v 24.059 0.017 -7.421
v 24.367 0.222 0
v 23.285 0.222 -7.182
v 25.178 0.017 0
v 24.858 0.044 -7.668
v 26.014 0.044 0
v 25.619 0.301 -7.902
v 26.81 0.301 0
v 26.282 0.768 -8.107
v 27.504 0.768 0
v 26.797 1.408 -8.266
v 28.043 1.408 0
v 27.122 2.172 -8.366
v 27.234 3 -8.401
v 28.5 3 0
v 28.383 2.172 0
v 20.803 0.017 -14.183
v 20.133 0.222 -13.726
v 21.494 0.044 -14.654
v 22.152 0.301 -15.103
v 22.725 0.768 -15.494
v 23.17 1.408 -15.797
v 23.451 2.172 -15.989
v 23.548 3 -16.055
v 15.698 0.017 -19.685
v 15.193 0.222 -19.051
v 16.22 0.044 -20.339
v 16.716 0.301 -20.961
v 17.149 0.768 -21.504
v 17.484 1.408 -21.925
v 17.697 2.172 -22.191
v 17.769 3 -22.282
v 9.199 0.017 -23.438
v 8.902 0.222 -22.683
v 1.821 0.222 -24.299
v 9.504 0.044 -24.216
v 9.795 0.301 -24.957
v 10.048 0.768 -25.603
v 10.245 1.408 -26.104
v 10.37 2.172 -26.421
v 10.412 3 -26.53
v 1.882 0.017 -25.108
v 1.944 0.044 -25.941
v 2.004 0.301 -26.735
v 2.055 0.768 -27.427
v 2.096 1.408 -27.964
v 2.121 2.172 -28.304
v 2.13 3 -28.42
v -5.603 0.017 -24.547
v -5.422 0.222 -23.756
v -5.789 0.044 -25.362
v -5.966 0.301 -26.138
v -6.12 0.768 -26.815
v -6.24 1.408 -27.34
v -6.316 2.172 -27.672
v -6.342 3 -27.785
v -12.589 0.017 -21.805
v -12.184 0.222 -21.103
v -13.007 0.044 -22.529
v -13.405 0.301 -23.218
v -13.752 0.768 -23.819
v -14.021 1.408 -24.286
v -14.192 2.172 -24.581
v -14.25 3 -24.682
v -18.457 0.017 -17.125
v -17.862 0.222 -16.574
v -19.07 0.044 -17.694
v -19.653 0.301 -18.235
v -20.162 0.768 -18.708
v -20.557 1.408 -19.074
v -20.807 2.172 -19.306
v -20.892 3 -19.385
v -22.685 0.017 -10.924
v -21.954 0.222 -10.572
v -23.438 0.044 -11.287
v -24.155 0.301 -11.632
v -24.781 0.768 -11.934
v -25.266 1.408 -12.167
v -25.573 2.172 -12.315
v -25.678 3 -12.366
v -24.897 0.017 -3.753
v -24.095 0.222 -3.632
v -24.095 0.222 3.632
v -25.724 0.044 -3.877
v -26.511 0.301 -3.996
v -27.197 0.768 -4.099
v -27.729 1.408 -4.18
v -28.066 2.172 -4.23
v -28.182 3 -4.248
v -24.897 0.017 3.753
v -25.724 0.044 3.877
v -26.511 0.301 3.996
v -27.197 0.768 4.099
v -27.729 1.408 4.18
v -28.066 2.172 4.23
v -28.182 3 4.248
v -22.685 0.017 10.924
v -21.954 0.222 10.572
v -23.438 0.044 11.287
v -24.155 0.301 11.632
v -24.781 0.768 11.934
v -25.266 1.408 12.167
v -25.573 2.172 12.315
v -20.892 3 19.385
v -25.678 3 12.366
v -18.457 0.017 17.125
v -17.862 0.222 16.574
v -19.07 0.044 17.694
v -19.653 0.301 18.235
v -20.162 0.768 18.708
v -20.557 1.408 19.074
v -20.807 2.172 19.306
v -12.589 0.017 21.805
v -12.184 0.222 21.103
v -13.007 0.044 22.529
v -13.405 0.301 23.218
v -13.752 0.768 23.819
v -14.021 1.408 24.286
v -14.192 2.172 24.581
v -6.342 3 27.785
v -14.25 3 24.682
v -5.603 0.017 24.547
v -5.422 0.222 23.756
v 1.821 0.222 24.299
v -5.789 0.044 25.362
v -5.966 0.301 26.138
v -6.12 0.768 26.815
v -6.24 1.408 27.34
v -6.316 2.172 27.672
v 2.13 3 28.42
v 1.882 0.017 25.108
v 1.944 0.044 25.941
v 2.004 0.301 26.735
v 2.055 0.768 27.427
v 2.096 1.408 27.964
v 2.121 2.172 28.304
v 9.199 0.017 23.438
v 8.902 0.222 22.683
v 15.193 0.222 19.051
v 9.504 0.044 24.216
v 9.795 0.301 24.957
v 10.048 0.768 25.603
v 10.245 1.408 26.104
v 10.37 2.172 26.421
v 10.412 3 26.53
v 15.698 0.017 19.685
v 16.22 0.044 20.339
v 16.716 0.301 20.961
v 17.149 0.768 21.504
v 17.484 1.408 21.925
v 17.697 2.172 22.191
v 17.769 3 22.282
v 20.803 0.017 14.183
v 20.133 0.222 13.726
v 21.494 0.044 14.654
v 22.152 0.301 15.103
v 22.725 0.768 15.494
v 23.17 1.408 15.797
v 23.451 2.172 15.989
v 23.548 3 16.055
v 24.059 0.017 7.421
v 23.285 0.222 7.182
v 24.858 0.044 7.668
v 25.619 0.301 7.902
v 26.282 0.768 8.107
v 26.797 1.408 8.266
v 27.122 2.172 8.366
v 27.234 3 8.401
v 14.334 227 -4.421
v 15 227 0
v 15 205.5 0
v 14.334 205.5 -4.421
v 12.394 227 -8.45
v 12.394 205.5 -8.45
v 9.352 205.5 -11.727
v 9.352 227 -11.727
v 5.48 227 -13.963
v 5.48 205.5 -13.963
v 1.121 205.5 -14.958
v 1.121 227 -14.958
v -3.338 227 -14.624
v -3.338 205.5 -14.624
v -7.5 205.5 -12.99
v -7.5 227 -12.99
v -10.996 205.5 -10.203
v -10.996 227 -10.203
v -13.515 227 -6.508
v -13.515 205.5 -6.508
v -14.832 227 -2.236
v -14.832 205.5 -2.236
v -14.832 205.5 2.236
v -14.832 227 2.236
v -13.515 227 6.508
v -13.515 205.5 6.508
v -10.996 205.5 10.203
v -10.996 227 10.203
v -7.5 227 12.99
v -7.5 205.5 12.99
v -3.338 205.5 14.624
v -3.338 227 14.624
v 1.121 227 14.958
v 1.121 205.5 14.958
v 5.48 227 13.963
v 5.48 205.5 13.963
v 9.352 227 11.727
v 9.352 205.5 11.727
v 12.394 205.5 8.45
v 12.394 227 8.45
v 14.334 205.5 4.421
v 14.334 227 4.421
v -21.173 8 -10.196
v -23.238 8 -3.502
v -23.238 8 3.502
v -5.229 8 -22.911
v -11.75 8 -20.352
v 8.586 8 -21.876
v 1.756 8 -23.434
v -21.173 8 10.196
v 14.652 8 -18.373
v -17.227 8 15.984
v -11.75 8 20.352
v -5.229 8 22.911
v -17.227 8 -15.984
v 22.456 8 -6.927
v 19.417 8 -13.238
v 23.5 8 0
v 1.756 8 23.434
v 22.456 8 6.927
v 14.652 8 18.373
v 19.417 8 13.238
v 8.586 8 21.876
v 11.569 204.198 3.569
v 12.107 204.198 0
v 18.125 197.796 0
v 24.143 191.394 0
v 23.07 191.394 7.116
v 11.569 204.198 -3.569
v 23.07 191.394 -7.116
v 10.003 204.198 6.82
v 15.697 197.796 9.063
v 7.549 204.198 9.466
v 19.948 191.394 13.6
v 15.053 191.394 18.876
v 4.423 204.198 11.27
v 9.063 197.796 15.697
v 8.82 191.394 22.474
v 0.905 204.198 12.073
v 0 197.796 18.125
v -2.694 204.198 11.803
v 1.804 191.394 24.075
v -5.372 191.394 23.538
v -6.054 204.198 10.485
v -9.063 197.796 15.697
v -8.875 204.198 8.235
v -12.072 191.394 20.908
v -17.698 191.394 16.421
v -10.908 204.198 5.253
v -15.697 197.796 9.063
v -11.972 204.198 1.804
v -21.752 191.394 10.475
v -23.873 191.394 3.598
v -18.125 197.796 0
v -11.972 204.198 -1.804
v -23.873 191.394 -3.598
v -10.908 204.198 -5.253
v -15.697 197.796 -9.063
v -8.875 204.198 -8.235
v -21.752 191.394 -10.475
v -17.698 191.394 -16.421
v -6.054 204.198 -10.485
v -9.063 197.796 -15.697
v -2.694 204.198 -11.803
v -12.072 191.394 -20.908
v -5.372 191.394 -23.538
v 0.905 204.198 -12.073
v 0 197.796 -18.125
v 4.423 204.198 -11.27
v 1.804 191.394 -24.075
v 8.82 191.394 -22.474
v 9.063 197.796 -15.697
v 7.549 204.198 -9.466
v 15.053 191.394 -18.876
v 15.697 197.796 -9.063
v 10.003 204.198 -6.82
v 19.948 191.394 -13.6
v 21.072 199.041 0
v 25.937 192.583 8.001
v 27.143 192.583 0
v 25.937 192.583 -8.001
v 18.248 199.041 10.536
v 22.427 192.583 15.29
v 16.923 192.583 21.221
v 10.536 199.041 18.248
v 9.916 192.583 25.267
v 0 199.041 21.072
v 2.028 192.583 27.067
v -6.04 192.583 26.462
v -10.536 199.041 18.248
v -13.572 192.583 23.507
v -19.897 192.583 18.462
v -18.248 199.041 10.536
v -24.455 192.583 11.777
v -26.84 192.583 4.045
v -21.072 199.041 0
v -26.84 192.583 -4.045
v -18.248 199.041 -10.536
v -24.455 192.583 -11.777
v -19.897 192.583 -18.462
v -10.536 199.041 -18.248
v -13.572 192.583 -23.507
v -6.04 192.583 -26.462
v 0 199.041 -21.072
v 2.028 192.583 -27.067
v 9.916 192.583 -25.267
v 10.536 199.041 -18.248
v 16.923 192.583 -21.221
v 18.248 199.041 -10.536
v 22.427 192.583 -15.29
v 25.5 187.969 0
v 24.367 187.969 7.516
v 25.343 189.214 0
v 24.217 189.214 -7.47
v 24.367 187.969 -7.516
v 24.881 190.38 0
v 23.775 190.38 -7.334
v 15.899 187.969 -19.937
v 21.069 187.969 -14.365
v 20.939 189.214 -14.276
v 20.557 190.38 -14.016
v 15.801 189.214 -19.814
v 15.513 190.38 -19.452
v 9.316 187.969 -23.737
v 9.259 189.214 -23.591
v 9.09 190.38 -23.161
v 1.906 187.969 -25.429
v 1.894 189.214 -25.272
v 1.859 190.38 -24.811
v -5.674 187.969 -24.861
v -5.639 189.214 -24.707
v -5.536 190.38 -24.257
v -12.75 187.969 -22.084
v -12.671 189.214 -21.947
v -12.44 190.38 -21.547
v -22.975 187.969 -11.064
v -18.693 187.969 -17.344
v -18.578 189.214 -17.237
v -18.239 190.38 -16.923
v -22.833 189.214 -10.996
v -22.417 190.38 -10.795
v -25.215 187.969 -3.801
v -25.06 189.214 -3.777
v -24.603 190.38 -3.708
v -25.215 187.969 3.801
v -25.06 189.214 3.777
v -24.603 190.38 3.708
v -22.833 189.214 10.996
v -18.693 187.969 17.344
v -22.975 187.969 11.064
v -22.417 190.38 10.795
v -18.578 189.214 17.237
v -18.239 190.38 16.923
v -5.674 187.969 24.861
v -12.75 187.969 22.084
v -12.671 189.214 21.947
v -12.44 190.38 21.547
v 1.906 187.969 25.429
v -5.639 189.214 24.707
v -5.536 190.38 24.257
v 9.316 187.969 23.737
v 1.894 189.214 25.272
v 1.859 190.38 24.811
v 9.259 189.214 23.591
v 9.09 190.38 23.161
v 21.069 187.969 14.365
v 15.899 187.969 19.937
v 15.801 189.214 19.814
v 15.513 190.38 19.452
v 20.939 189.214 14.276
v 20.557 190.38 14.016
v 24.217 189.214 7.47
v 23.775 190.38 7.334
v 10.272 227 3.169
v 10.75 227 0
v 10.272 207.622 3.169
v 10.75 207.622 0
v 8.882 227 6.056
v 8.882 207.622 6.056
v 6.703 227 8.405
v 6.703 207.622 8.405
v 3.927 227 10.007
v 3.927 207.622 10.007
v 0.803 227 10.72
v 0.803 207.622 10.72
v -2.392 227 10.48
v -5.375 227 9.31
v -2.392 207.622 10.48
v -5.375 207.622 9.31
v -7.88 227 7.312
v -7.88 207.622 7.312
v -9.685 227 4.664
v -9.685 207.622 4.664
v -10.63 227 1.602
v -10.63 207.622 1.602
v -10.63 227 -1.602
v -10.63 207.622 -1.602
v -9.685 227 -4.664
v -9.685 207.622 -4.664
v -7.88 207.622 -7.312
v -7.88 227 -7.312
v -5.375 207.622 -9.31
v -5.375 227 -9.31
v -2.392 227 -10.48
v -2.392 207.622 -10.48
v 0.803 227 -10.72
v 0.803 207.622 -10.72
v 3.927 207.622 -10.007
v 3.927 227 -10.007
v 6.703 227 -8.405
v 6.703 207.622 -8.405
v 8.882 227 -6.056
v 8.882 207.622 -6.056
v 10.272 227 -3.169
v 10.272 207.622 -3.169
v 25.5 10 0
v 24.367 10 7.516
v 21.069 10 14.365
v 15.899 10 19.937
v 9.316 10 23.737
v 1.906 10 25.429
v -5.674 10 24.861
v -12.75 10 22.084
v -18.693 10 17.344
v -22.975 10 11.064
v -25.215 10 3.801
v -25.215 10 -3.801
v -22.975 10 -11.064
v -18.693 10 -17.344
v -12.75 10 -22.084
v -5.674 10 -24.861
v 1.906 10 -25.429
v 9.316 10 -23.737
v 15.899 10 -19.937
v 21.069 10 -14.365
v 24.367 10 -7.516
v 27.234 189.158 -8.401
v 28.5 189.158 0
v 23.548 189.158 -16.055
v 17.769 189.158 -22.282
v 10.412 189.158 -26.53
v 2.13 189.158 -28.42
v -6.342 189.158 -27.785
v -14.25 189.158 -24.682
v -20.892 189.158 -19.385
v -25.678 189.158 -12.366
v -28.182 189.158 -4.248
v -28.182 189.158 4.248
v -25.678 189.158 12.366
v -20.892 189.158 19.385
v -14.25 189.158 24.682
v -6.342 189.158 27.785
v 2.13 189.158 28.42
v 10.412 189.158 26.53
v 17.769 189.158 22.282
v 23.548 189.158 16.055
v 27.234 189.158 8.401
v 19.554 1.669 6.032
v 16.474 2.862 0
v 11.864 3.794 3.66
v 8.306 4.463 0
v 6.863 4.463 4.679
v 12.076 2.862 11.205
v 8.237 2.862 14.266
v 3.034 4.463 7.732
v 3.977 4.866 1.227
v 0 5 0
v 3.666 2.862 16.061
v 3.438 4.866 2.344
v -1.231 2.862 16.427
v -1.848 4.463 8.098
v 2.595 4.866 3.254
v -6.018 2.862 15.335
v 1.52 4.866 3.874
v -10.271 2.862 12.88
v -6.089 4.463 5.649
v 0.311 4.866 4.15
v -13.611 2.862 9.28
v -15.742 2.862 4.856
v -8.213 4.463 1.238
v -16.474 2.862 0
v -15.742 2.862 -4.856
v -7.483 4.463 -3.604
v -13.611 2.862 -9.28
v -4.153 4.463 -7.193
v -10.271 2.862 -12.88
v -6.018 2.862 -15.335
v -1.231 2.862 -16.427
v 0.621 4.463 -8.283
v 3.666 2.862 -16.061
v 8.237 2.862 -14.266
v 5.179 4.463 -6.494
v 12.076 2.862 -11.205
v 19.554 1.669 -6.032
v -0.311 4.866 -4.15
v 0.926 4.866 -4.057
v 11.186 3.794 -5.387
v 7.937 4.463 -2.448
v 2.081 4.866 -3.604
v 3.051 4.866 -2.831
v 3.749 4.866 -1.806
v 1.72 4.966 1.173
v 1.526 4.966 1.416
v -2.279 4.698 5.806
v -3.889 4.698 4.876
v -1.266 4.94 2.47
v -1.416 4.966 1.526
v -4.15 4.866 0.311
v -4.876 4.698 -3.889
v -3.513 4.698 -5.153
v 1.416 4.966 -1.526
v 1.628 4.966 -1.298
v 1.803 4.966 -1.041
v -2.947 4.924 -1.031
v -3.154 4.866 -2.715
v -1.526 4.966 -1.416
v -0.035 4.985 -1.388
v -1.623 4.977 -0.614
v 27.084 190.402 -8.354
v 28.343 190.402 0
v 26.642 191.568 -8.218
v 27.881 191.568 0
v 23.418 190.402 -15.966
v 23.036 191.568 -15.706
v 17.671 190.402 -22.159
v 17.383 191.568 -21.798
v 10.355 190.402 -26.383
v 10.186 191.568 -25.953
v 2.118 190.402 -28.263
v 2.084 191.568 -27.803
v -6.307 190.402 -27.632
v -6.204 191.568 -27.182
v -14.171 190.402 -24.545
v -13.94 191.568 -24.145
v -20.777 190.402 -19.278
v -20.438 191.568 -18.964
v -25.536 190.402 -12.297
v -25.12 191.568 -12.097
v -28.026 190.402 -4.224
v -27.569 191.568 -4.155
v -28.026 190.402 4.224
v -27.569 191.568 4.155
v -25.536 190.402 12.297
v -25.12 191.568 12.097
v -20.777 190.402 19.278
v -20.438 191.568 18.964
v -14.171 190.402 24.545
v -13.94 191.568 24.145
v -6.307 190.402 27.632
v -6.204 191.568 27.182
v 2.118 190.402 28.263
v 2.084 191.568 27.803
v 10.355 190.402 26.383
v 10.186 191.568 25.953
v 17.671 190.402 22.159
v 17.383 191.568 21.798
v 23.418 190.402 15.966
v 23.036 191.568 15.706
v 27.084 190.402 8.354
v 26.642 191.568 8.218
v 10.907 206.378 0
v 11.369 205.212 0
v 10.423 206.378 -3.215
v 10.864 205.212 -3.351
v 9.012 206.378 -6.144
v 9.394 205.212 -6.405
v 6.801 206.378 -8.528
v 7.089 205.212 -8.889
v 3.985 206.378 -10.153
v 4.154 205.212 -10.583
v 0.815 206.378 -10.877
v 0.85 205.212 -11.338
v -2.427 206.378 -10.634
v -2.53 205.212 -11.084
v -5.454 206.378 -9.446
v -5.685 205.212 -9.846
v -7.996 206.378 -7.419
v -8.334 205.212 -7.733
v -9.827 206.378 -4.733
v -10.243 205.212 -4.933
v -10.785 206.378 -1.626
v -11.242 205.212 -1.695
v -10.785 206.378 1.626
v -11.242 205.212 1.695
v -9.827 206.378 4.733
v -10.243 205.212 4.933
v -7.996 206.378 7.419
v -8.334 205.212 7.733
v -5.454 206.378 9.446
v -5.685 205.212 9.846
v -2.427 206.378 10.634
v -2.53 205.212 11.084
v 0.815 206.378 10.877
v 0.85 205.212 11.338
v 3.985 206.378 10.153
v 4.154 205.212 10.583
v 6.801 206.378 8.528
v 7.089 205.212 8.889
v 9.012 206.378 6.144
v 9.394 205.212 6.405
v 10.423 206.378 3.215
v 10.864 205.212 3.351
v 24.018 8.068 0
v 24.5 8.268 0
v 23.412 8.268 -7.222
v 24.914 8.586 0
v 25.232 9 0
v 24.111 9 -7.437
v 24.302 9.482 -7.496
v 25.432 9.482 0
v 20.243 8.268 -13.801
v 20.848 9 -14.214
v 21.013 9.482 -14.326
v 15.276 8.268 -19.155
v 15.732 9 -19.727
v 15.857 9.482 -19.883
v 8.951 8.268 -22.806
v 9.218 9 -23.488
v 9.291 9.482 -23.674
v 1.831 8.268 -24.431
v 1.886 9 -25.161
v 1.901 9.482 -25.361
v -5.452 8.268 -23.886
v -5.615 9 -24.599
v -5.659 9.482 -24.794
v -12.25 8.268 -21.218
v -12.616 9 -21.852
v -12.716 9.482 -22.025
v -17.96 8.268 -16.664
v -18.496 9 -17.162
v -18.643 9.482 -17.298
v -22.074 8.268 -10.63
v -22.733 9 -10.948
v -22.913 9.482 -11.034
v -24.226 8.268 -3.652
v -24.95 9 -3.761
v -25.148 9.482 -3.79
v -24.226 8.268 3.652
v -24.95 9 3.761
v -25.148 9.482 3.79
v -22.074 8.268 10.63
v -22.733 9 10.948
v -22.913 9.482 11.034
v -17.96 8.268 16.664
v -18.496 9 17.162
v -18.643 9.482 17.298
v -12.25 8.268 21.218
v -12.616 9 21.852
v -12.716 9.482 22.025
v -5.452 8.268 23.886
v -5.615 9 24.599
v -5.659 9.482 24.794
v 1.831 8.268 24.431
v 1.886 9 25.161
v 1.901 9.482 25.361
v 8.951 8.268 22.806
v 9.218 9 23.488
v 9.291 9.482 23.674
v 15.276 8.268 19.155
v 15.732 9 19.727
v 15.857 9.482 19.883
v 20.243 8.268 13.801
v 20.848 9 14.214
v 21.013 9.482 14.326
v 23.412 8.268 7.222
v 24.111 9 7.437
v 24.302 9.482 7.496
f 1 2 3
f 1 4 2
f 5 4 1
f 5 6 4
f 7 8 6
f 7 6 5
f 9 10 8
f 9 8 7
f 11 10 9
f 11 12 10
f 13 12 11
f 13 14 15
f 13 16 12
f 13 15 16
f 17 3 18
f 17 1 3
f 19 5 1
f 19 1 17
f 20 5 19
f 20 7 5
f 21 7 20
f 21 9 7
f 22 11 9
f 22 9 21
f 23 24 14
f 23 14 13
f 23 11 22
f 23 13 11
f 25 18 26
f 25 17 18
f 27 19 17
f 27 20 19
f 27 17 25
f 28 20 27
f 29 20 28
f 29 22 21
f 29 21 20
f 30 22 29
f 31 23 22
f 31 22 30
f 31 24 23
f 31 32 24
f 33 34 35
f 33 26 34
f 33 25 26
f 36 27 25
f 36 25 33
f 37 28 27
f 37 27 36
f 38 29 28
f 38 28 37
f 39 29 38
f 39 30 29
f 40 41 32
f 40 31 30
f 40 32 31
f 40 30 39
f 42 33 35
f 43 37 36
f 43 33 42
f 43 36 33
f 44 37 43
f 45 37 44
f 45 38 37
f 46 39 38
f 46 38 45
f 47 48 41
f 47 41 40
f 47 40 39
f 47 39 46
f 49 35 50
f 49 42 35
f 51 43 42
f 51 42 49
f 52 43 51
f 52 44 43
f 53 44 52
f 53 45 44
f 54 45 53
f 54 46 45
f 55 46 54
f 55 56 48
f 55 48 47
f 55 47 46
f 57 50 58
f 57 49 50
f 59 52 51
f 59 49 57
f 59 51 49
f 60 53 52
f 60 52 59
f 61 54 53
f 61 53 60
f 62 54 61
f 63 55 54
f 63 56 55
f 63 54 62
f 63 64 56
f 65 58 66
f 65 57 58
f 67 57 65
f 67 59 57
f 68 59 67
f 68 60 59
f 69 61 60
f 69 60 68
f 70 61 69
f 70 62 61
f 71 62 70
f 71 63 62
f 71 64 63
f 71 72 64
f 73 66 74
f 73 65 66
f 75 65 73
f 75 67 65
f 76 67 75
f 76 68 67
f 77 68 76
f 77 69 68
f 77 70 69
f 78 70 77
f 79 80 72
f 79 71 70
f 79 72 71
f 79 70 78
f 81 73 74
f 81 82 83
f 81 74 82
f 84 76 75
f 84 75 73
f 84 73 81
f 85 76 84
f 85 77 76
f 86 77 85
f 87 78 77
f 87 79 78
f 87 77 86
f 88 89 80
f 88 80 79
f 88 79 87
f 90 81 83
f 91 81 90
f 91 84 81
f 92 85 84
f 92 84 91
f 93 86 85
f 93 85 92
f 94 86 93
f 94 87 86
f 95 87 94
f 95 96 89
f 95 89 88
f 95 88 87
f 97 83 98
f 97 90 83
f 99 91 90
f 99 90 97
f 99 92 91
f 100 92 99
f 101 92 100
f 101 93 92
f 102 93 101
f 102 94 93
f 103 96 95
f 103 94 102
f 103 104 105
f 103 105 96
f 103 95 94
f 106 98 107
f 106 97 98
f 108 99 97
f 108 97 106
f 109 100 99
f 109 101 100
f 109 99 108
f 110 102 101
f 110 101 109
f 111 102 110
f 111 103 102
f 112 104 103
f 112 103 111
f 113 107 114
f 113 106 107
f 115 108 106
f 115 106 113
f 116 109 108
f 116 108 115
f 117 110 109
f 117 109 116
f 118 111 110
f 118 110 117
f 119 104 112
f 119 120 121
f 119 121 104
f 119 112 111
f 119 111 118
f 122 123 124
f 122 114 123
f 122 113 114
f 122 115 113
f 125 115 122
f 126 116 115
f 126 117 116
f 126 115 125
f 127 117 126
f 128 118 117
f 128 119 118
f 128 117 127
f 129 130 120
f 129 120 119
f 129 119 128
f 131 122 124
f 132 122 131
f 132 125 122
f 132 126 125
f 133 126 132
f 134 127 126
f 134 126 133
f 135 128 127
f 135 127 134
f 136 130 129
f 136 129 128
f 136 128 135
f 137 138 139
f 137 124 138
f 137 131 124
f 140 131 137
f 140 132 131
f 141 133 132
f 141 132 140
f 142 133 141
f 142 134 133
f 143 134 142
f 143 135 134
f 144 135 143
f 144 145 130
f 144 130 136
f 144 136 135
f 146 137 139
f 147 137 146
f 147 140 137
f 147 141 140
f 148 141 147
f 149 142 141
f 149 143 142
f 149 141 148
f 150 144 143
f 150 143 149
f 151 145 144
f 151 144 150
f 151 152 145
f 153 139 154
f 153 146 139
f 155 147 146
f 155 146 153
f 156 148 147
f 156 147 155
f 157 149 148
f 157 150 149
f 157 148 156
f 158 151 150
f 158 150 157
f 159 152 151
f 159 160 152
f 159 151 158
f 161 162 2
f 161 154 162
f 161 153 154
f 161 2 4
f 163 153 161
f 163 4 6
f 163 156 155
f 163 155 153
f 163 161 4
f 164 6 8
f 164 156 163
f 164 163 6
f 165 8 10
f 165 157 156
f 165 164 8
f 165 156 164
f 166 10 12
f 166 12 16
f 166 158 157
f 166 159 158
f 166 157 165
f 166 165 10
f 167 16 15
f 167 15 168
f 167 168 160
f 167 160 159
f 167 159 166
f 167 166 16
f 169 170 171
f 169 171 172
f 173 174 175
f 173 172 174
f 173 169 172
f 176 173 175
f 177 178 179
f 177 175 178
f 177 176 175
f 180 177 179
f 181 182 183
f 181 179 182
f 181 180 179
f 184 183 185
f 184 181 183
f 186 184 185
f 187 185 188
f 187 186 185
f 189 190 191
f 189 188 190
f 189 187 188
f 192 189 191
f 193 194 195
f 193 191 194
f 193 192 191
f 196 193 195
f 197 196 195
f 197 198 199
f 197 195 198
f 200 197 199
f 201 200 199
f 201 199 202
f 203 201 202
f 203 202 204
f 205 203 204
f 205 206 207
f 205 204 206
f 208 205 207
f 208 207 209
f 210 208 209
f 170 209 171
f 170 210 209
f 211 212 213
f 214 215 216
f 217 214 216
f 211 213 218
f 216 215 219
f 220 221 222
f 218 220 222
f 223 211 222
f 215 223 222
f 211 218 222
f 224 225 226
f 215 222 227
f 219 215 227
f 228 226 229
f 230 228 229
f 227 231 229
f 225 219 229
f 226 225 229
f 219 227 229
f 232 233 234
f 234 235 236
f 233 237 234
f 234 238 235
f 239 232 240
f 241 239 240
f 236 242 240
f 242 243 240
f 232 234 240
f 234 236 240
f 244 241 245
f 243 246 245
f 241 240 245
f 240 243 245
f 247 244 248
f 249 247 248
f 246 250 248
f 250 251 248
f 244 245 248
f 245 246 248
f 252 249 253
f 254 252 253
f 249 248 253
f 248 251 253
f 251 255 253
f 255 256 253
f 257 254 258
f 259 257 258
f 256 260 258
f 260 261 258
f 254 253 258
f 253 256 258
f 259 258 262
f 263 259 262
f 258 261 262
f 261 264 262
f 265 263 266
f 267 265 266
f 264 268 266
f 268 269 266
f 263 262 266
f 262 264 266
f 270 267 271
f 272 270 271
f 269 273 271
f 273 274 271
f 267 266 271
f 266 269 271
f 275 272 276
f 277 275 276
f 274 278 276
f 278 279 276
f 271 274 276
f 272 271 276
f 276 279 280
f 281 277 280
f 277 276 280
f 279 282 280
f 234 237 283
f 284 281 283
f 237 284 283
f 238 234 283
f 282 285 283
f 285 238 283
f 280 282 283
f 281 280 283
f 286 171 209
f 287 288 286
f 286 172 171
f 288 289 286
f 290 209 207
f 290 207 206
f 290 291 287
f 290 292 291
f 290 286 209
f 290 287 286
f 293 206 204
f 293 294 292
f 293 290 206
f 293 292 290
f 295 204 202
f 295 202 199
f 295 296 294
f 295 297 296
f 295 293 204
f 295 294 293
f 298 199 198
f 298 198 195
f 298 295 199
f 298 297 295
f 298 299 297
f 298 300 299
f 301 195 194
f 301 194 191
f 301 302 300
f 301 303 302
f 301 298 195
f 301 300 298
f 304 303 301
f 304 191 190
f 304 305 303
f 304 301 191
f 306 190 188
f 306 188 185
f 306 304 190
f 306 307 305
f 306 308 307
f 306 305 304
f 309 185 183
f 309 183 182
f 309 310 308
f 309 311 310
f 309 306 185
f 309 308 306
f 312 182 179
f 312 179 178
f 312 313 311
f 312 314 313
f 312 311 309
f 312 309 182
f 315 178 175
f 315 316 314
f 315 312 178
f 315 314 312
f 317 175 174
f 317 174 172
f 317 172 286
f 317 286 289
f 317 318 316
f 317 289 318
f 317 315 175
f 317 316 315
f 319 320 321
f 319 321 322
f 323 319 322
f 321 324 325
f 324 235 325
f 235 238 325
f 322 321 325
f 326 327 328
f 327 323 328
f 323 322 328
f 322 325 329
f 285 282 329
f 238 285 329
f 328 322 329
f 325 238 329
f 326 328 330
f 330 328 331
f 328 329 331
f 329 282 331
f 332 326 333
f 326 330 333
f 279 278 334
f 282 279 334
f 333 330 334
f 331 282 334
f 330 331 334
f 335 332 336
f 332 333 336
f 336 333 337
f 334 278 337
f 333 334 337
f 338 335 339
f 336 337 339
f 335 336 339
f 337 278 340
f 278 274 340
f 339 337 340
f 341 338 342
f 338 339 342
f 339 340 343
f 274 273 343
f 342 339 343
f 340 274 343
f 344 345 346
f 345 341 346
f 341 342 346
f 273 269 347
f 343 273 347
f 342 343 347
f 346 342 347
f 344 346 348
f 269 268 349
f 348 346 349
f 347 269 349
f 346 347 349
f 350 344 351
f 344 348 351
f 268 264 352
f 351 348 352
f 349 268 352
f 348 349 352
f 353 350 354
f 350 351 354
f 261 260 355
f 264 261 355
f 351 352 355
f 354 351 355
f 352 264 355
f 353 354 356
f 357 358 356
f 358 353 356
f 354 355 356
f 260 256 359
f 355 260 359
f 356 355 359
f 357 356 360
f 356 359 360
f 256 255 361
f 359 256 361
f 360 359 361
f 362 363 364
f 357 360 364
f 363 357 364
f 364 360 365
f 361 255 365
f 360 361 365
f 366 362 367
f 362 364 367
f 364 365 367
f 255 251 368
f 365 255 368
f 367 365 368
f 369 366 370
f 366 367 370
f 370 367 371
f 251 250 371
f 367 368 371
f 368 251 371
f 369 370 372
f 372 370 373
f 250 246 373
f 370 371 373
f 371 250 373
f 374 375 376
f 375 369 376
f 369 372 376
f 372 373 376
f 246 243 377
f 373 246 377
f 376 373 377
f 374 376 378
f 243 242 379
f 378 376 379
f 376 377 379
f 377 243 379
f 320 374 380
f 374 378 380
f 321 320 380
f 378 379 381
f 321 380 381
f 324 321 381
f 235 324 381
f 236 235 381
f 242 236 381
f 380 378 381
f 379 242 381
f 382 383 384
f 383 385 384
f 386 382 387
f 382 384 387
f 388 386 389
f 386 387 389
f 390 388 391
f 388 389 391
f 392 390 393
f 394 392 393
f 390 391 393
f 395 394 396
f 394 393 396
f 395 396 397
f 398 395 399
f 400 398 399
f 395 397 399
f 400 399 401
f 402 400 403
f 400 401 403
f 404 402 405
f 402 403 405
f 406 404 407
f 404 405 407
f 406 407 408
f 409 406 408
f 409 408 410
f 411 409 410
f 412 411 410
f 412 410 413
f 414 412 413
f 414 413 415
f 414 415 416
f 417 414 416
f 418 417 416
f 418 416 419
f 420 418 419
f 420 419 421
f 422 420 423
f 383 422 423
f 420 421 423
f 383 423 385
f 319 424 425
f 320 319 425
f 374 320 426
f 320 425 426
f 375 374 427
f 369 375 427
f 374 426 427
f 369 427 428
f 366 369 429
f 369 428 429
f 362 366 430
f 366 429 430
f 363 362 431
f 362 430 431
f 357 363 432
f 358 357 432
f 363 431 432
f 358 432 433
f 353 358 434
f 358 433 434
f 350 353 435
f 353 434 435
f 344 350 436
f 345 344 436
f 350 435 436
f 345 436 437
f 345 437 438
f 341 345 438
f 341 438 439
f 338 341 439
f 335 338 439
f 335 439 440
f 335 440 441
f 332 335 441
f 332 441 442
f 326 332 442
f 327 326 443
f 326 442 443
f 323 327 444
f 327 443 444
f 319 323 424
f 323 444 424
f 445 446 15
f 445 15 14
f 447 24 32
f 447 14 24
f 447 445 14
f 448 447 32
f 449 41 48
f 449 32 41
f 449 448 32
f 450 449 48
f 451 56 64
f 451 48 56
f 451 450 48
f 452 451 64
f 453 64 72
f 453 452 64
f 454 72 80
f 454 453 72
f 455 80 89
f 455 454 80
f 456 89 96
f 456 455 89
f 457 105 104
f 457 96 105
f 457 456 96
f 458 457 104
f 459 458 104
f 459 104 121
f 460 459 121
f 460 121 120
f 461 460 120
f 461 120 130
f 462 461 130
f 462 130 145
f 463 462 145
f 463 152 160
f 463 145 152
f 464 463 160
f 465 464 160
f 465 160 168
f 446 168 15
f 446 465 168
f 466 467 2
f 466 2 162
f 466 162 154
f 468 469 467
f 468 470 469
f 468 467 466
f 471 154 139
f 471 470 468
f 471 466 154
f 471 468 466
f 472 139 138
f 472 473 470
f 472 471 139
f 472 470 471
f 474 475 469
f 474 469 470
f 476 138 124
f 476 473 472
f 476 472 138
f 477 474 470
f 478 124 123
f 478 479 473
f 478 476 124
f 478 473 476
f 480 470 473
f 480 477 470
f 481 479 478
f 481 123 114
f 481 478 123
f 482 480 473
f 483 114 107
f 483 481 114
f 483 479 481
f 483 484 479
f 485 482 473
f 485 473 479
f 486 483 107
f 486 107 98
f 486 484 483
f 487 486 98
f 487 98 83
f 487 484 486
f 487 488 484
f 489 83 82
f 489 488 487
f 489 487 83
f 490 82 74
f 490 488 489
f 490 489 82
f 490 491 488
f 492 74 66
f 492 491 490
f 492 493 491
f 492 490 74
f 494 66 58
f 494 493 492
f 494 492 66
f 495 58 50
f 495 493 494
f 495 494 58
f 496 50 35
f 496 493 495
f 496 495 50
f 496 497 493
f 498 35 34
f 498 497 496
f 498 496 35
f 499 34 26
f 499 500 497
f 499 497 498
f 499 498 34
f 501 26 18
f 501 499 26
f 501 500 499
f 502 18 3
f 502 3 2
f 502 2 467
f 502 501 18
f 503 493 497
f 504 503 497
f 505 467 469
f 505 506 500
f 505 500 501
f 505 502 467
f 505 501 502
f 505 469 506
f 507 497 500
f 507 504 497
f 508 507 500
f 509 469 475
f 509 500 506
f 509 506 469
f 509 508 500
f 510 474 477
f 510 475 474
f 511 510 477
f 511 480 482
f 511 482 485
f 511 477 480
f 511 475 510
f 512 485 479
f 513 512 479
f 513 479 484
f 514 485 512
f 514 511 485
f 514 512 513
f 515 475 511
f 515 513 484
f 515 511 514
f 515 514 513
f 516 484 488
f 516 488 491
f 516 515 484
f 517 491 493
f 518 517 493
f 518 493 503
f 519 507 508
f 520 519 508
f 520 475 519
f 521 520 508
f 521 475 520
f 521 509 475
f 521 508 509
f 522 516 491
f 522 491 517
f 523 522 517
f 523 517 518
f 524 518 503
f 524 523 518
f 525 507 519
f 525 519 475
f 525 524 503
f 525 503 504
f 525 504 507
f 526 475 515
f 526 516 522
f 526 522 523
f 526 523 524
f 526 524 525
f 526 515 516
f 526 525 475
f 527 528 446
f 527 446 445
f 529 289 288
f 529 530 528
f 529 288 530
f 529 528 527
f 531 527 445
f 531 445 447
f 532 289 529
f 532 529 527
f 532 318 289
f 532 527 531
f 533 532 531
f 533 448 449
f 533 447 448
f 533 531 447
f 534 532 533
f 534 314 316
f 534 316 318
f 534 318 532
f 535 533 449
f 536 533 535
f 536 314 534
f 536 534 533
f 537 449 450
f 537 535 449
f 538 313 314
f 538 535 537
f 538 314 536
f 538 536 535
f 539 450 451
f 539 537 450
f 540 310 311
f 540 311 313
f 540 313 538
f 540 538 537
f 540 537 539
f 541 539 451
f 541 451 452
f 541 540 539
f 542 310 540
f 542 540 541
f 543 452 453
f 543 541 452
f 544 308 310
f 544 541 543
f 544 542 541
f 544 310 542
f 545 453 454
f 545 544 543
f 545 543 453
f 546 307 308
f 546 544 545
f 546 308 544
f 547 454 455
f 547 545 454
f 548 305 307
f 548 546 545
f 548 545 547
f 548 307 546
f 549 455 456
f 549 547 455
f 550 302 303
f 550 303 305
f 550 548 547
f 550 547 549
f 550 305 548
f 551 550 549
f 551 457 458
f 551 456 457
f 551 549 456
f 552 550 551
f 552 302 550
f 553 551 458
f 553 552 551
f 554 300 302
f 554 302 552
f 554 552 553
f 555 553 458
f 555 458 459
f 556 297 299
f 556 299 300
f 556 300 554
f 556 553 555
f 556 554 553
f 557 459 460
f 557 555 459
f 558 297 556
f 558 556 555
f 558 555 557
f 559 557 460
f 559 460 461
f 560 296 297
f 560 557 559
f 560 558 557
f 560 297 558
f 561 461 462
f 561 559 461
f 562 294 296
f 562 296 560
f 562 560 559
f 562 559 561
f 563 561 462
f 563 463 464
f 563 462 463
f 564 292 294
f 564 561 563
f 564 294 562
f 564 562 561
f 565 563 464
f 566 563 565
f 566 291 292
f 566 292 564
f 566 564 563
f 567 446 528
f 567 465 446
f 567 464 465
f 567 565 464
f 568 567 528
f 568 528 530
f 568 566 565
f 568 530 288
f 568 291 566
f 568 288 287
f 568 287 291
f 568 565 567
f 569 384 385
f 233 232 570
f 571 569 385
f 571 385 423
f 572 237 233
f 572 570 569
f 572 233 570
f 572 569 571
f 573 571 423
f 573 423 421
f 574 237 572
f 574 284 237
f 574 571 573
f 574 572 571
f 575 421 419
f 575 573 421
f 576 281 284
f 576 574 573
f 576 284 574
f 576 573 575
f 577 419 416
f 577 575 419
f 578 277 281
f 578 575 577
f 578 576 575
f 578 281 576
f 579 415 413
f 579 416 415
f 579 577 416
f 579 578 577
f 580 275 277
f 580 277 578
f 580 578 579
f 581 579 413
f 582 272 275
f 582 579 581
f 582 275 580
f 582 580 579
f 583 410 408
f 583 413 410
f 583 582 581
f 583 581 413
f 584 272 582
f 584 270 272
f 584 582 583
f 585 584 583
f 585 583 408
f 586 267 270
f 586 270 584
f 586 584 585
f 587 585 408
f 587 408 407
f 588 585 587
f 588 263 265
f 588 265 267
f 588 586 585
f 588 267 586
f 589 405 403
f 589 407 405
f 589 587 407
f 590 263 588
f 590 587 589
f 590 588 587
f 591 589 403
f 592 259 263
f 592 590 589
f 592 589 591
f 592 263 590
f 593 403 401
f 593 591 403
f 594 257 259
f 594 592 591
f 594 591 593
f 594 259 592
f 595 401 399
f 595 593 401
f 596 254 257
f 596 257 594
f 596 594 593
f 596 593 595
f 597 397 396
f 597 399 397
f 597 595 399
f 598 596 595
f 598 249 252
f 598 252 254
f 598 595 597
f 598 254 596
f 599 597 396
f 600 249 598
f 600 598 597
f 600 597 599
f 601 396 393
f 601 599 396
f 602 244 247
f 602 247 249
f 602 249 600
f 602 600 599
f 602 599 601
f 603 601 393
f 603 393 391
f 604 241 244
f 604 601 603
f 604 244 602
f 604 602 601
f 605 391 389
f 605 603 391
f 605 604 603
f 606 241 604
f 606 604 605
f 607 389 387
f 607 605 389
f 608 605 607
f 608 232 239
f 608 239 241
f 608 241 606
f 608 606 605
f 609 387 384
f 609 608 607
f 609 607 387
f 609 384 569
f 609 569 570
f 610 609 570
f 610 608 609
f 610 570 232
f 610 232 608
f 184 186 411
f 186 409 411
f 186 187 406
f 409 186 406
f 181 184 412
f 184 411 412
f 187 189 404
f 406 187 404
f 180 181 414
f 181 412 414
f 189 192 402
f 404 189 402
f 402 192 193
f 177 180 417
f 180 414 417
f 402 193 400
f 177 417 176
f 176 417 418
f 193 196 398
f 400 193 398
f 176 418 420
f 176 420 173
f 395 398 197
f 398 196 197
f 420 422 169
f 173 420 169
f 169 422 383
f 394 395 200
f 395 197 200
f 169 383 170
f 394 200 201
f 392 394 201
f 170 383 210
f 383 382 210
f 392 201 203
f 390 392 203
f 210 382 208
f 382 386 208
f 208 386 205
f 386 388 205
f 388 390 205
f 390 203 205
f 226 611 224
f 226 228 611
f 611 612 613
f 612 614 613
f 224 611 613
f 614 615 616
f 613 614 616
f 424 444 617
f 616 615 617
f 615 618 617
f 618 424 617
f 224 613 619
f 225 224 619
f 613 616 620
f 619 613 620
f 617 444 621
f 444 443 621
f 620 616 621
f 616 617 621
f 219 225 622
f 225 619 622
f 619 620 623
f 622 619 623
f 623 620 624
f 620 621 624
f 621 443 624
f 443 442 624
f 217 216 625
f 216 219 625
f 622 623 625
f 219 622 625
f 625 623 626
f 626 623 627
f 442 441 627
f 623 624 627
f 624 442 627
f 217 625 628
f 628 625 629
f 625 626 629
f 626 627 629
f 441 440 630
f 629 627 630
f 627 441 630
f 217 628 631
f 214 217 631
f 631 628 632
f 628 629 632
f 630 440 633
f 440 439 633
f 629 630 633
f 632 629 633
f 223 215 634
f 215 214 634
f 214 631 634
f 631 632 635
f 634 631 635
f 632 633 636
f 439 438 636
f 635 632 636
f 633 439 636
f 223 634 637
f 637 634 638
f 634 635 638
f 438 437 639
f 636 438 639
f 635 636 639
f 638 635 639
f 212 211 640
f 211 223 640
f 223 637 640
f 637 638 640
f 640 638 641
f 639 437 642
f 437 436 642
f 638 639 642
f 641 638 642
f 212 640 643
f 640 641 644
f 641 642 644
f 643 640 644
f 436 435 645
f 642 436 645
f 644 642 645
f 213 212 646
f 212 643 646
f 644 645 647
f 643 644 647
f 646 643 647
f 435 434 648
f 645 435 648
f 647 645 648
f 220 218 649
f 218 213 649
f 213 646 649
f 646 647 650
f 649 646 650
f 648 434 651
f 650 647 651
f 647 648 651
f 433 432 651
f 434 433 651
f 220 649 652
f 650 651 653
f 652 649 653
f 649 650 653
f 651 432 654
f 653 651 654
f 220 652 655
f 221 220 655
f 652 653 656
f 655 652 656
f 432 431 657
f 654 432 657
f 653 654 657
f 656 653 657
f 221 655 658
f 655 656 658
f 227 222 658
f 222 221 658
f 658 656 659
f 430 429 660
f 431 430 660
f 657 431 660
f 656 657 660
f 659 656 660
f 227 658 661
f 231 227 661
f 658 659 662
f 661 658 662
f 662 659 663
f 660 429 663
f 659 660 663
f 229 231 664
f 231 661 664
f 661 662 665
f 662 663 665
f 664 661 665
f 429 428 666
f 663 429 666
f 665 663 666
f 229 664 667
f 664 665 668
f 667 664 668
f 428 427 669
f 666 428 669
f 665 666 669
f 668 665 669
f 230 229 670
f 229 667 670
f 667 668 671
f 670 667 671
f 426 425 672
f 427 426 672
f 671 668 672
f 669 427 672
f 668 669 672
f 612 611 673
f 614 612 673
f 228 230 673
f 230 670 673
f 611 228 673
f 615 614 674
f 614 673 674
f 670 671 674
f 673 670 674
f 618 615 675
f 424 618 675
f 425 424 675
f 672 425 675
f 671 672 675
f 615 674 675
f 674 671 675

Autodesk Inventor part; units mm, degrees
ref_plane "YZ Plane" through (0, 0, 0) normal (1, 0, 0) x (0, 1, 0)
ref_plane "XZ Plane" through (0, 0, 0) normal (0, 1, 0) x (-1, 0, 0)
ref_plane "XY Plane" through (0, 0, 0) normal (0, 0, 1) x (1, 0, 0)
sketch "Esquisse1" plane through (0, 0, 0) normal (0, 0, 1) x (1, 0, 0)
  line L0 (0, 8) -> (0, 5)
  arc A0 (24.3671, 0.2221) -> (0, 5) centre (0, -59.525) ccw
  arc A1 (24.3671, 0.2221) -> (28.5, 3) centre (25.5, 3) ccw
  line L1 (28.5, 3) -> (28.5, 189.1581)
  arc A2 (28.5, 189.1581) -> (27.143, 192.5828) centre (23.5, 189.1581) ccw
  line L2 (27.143, 192.5828) -> (15, 205.5)
  line L3 (15, 205.5) -> (15, 227)
  line L4 (15, 227) -> (10.75, 227)
  line L5 (10.75, 227) -> (10.75, 207.6222)
  arc A3 (10.75, 207.6222) -> (12.107, 204.1975) centre (15.75, 207.6222) ccw
  line L6 (12.107, 204.1975) -> (24.143, 191.3941)
  arc A4 (25.5, 187.9694) -> (24.143, 191.3941) centre (20.5, 187.9694) ccw
  line L7 (25.5, 187.9694) -> (25.5, 10)
  arc A5 (23.5, 8) -> (25.5, 10) centre (23.5, 10) ccw
  line L8 (23.5, 8) -> (0, 8)
  line L9 (0, 0) -> (25.5, 0) construction
  point P0 (28.1484, 191)
  dimension "d0" = 57
  dimension "d1" = 30
  dimension "d2" = 21.5
  dimension "d3" = 21.5
  dimension "d4" = 3
  dimension "d5" = 3
  dimension "d6" = 14.5
  dimension "d7" = 5
  dimension "d8" = 3
  dimension "d9" = 3
  dimension "d10" = 2
  dimension "d11" = 227
  dimension "d12" = 5
revolve "Révolution1" add sketch "Esquisse1" angle 360 about axis through (0, 8, 0) along (0, -1, 0)
equation "\"d5\" = d4"
properties part number "Bouteille" material "Verre"
